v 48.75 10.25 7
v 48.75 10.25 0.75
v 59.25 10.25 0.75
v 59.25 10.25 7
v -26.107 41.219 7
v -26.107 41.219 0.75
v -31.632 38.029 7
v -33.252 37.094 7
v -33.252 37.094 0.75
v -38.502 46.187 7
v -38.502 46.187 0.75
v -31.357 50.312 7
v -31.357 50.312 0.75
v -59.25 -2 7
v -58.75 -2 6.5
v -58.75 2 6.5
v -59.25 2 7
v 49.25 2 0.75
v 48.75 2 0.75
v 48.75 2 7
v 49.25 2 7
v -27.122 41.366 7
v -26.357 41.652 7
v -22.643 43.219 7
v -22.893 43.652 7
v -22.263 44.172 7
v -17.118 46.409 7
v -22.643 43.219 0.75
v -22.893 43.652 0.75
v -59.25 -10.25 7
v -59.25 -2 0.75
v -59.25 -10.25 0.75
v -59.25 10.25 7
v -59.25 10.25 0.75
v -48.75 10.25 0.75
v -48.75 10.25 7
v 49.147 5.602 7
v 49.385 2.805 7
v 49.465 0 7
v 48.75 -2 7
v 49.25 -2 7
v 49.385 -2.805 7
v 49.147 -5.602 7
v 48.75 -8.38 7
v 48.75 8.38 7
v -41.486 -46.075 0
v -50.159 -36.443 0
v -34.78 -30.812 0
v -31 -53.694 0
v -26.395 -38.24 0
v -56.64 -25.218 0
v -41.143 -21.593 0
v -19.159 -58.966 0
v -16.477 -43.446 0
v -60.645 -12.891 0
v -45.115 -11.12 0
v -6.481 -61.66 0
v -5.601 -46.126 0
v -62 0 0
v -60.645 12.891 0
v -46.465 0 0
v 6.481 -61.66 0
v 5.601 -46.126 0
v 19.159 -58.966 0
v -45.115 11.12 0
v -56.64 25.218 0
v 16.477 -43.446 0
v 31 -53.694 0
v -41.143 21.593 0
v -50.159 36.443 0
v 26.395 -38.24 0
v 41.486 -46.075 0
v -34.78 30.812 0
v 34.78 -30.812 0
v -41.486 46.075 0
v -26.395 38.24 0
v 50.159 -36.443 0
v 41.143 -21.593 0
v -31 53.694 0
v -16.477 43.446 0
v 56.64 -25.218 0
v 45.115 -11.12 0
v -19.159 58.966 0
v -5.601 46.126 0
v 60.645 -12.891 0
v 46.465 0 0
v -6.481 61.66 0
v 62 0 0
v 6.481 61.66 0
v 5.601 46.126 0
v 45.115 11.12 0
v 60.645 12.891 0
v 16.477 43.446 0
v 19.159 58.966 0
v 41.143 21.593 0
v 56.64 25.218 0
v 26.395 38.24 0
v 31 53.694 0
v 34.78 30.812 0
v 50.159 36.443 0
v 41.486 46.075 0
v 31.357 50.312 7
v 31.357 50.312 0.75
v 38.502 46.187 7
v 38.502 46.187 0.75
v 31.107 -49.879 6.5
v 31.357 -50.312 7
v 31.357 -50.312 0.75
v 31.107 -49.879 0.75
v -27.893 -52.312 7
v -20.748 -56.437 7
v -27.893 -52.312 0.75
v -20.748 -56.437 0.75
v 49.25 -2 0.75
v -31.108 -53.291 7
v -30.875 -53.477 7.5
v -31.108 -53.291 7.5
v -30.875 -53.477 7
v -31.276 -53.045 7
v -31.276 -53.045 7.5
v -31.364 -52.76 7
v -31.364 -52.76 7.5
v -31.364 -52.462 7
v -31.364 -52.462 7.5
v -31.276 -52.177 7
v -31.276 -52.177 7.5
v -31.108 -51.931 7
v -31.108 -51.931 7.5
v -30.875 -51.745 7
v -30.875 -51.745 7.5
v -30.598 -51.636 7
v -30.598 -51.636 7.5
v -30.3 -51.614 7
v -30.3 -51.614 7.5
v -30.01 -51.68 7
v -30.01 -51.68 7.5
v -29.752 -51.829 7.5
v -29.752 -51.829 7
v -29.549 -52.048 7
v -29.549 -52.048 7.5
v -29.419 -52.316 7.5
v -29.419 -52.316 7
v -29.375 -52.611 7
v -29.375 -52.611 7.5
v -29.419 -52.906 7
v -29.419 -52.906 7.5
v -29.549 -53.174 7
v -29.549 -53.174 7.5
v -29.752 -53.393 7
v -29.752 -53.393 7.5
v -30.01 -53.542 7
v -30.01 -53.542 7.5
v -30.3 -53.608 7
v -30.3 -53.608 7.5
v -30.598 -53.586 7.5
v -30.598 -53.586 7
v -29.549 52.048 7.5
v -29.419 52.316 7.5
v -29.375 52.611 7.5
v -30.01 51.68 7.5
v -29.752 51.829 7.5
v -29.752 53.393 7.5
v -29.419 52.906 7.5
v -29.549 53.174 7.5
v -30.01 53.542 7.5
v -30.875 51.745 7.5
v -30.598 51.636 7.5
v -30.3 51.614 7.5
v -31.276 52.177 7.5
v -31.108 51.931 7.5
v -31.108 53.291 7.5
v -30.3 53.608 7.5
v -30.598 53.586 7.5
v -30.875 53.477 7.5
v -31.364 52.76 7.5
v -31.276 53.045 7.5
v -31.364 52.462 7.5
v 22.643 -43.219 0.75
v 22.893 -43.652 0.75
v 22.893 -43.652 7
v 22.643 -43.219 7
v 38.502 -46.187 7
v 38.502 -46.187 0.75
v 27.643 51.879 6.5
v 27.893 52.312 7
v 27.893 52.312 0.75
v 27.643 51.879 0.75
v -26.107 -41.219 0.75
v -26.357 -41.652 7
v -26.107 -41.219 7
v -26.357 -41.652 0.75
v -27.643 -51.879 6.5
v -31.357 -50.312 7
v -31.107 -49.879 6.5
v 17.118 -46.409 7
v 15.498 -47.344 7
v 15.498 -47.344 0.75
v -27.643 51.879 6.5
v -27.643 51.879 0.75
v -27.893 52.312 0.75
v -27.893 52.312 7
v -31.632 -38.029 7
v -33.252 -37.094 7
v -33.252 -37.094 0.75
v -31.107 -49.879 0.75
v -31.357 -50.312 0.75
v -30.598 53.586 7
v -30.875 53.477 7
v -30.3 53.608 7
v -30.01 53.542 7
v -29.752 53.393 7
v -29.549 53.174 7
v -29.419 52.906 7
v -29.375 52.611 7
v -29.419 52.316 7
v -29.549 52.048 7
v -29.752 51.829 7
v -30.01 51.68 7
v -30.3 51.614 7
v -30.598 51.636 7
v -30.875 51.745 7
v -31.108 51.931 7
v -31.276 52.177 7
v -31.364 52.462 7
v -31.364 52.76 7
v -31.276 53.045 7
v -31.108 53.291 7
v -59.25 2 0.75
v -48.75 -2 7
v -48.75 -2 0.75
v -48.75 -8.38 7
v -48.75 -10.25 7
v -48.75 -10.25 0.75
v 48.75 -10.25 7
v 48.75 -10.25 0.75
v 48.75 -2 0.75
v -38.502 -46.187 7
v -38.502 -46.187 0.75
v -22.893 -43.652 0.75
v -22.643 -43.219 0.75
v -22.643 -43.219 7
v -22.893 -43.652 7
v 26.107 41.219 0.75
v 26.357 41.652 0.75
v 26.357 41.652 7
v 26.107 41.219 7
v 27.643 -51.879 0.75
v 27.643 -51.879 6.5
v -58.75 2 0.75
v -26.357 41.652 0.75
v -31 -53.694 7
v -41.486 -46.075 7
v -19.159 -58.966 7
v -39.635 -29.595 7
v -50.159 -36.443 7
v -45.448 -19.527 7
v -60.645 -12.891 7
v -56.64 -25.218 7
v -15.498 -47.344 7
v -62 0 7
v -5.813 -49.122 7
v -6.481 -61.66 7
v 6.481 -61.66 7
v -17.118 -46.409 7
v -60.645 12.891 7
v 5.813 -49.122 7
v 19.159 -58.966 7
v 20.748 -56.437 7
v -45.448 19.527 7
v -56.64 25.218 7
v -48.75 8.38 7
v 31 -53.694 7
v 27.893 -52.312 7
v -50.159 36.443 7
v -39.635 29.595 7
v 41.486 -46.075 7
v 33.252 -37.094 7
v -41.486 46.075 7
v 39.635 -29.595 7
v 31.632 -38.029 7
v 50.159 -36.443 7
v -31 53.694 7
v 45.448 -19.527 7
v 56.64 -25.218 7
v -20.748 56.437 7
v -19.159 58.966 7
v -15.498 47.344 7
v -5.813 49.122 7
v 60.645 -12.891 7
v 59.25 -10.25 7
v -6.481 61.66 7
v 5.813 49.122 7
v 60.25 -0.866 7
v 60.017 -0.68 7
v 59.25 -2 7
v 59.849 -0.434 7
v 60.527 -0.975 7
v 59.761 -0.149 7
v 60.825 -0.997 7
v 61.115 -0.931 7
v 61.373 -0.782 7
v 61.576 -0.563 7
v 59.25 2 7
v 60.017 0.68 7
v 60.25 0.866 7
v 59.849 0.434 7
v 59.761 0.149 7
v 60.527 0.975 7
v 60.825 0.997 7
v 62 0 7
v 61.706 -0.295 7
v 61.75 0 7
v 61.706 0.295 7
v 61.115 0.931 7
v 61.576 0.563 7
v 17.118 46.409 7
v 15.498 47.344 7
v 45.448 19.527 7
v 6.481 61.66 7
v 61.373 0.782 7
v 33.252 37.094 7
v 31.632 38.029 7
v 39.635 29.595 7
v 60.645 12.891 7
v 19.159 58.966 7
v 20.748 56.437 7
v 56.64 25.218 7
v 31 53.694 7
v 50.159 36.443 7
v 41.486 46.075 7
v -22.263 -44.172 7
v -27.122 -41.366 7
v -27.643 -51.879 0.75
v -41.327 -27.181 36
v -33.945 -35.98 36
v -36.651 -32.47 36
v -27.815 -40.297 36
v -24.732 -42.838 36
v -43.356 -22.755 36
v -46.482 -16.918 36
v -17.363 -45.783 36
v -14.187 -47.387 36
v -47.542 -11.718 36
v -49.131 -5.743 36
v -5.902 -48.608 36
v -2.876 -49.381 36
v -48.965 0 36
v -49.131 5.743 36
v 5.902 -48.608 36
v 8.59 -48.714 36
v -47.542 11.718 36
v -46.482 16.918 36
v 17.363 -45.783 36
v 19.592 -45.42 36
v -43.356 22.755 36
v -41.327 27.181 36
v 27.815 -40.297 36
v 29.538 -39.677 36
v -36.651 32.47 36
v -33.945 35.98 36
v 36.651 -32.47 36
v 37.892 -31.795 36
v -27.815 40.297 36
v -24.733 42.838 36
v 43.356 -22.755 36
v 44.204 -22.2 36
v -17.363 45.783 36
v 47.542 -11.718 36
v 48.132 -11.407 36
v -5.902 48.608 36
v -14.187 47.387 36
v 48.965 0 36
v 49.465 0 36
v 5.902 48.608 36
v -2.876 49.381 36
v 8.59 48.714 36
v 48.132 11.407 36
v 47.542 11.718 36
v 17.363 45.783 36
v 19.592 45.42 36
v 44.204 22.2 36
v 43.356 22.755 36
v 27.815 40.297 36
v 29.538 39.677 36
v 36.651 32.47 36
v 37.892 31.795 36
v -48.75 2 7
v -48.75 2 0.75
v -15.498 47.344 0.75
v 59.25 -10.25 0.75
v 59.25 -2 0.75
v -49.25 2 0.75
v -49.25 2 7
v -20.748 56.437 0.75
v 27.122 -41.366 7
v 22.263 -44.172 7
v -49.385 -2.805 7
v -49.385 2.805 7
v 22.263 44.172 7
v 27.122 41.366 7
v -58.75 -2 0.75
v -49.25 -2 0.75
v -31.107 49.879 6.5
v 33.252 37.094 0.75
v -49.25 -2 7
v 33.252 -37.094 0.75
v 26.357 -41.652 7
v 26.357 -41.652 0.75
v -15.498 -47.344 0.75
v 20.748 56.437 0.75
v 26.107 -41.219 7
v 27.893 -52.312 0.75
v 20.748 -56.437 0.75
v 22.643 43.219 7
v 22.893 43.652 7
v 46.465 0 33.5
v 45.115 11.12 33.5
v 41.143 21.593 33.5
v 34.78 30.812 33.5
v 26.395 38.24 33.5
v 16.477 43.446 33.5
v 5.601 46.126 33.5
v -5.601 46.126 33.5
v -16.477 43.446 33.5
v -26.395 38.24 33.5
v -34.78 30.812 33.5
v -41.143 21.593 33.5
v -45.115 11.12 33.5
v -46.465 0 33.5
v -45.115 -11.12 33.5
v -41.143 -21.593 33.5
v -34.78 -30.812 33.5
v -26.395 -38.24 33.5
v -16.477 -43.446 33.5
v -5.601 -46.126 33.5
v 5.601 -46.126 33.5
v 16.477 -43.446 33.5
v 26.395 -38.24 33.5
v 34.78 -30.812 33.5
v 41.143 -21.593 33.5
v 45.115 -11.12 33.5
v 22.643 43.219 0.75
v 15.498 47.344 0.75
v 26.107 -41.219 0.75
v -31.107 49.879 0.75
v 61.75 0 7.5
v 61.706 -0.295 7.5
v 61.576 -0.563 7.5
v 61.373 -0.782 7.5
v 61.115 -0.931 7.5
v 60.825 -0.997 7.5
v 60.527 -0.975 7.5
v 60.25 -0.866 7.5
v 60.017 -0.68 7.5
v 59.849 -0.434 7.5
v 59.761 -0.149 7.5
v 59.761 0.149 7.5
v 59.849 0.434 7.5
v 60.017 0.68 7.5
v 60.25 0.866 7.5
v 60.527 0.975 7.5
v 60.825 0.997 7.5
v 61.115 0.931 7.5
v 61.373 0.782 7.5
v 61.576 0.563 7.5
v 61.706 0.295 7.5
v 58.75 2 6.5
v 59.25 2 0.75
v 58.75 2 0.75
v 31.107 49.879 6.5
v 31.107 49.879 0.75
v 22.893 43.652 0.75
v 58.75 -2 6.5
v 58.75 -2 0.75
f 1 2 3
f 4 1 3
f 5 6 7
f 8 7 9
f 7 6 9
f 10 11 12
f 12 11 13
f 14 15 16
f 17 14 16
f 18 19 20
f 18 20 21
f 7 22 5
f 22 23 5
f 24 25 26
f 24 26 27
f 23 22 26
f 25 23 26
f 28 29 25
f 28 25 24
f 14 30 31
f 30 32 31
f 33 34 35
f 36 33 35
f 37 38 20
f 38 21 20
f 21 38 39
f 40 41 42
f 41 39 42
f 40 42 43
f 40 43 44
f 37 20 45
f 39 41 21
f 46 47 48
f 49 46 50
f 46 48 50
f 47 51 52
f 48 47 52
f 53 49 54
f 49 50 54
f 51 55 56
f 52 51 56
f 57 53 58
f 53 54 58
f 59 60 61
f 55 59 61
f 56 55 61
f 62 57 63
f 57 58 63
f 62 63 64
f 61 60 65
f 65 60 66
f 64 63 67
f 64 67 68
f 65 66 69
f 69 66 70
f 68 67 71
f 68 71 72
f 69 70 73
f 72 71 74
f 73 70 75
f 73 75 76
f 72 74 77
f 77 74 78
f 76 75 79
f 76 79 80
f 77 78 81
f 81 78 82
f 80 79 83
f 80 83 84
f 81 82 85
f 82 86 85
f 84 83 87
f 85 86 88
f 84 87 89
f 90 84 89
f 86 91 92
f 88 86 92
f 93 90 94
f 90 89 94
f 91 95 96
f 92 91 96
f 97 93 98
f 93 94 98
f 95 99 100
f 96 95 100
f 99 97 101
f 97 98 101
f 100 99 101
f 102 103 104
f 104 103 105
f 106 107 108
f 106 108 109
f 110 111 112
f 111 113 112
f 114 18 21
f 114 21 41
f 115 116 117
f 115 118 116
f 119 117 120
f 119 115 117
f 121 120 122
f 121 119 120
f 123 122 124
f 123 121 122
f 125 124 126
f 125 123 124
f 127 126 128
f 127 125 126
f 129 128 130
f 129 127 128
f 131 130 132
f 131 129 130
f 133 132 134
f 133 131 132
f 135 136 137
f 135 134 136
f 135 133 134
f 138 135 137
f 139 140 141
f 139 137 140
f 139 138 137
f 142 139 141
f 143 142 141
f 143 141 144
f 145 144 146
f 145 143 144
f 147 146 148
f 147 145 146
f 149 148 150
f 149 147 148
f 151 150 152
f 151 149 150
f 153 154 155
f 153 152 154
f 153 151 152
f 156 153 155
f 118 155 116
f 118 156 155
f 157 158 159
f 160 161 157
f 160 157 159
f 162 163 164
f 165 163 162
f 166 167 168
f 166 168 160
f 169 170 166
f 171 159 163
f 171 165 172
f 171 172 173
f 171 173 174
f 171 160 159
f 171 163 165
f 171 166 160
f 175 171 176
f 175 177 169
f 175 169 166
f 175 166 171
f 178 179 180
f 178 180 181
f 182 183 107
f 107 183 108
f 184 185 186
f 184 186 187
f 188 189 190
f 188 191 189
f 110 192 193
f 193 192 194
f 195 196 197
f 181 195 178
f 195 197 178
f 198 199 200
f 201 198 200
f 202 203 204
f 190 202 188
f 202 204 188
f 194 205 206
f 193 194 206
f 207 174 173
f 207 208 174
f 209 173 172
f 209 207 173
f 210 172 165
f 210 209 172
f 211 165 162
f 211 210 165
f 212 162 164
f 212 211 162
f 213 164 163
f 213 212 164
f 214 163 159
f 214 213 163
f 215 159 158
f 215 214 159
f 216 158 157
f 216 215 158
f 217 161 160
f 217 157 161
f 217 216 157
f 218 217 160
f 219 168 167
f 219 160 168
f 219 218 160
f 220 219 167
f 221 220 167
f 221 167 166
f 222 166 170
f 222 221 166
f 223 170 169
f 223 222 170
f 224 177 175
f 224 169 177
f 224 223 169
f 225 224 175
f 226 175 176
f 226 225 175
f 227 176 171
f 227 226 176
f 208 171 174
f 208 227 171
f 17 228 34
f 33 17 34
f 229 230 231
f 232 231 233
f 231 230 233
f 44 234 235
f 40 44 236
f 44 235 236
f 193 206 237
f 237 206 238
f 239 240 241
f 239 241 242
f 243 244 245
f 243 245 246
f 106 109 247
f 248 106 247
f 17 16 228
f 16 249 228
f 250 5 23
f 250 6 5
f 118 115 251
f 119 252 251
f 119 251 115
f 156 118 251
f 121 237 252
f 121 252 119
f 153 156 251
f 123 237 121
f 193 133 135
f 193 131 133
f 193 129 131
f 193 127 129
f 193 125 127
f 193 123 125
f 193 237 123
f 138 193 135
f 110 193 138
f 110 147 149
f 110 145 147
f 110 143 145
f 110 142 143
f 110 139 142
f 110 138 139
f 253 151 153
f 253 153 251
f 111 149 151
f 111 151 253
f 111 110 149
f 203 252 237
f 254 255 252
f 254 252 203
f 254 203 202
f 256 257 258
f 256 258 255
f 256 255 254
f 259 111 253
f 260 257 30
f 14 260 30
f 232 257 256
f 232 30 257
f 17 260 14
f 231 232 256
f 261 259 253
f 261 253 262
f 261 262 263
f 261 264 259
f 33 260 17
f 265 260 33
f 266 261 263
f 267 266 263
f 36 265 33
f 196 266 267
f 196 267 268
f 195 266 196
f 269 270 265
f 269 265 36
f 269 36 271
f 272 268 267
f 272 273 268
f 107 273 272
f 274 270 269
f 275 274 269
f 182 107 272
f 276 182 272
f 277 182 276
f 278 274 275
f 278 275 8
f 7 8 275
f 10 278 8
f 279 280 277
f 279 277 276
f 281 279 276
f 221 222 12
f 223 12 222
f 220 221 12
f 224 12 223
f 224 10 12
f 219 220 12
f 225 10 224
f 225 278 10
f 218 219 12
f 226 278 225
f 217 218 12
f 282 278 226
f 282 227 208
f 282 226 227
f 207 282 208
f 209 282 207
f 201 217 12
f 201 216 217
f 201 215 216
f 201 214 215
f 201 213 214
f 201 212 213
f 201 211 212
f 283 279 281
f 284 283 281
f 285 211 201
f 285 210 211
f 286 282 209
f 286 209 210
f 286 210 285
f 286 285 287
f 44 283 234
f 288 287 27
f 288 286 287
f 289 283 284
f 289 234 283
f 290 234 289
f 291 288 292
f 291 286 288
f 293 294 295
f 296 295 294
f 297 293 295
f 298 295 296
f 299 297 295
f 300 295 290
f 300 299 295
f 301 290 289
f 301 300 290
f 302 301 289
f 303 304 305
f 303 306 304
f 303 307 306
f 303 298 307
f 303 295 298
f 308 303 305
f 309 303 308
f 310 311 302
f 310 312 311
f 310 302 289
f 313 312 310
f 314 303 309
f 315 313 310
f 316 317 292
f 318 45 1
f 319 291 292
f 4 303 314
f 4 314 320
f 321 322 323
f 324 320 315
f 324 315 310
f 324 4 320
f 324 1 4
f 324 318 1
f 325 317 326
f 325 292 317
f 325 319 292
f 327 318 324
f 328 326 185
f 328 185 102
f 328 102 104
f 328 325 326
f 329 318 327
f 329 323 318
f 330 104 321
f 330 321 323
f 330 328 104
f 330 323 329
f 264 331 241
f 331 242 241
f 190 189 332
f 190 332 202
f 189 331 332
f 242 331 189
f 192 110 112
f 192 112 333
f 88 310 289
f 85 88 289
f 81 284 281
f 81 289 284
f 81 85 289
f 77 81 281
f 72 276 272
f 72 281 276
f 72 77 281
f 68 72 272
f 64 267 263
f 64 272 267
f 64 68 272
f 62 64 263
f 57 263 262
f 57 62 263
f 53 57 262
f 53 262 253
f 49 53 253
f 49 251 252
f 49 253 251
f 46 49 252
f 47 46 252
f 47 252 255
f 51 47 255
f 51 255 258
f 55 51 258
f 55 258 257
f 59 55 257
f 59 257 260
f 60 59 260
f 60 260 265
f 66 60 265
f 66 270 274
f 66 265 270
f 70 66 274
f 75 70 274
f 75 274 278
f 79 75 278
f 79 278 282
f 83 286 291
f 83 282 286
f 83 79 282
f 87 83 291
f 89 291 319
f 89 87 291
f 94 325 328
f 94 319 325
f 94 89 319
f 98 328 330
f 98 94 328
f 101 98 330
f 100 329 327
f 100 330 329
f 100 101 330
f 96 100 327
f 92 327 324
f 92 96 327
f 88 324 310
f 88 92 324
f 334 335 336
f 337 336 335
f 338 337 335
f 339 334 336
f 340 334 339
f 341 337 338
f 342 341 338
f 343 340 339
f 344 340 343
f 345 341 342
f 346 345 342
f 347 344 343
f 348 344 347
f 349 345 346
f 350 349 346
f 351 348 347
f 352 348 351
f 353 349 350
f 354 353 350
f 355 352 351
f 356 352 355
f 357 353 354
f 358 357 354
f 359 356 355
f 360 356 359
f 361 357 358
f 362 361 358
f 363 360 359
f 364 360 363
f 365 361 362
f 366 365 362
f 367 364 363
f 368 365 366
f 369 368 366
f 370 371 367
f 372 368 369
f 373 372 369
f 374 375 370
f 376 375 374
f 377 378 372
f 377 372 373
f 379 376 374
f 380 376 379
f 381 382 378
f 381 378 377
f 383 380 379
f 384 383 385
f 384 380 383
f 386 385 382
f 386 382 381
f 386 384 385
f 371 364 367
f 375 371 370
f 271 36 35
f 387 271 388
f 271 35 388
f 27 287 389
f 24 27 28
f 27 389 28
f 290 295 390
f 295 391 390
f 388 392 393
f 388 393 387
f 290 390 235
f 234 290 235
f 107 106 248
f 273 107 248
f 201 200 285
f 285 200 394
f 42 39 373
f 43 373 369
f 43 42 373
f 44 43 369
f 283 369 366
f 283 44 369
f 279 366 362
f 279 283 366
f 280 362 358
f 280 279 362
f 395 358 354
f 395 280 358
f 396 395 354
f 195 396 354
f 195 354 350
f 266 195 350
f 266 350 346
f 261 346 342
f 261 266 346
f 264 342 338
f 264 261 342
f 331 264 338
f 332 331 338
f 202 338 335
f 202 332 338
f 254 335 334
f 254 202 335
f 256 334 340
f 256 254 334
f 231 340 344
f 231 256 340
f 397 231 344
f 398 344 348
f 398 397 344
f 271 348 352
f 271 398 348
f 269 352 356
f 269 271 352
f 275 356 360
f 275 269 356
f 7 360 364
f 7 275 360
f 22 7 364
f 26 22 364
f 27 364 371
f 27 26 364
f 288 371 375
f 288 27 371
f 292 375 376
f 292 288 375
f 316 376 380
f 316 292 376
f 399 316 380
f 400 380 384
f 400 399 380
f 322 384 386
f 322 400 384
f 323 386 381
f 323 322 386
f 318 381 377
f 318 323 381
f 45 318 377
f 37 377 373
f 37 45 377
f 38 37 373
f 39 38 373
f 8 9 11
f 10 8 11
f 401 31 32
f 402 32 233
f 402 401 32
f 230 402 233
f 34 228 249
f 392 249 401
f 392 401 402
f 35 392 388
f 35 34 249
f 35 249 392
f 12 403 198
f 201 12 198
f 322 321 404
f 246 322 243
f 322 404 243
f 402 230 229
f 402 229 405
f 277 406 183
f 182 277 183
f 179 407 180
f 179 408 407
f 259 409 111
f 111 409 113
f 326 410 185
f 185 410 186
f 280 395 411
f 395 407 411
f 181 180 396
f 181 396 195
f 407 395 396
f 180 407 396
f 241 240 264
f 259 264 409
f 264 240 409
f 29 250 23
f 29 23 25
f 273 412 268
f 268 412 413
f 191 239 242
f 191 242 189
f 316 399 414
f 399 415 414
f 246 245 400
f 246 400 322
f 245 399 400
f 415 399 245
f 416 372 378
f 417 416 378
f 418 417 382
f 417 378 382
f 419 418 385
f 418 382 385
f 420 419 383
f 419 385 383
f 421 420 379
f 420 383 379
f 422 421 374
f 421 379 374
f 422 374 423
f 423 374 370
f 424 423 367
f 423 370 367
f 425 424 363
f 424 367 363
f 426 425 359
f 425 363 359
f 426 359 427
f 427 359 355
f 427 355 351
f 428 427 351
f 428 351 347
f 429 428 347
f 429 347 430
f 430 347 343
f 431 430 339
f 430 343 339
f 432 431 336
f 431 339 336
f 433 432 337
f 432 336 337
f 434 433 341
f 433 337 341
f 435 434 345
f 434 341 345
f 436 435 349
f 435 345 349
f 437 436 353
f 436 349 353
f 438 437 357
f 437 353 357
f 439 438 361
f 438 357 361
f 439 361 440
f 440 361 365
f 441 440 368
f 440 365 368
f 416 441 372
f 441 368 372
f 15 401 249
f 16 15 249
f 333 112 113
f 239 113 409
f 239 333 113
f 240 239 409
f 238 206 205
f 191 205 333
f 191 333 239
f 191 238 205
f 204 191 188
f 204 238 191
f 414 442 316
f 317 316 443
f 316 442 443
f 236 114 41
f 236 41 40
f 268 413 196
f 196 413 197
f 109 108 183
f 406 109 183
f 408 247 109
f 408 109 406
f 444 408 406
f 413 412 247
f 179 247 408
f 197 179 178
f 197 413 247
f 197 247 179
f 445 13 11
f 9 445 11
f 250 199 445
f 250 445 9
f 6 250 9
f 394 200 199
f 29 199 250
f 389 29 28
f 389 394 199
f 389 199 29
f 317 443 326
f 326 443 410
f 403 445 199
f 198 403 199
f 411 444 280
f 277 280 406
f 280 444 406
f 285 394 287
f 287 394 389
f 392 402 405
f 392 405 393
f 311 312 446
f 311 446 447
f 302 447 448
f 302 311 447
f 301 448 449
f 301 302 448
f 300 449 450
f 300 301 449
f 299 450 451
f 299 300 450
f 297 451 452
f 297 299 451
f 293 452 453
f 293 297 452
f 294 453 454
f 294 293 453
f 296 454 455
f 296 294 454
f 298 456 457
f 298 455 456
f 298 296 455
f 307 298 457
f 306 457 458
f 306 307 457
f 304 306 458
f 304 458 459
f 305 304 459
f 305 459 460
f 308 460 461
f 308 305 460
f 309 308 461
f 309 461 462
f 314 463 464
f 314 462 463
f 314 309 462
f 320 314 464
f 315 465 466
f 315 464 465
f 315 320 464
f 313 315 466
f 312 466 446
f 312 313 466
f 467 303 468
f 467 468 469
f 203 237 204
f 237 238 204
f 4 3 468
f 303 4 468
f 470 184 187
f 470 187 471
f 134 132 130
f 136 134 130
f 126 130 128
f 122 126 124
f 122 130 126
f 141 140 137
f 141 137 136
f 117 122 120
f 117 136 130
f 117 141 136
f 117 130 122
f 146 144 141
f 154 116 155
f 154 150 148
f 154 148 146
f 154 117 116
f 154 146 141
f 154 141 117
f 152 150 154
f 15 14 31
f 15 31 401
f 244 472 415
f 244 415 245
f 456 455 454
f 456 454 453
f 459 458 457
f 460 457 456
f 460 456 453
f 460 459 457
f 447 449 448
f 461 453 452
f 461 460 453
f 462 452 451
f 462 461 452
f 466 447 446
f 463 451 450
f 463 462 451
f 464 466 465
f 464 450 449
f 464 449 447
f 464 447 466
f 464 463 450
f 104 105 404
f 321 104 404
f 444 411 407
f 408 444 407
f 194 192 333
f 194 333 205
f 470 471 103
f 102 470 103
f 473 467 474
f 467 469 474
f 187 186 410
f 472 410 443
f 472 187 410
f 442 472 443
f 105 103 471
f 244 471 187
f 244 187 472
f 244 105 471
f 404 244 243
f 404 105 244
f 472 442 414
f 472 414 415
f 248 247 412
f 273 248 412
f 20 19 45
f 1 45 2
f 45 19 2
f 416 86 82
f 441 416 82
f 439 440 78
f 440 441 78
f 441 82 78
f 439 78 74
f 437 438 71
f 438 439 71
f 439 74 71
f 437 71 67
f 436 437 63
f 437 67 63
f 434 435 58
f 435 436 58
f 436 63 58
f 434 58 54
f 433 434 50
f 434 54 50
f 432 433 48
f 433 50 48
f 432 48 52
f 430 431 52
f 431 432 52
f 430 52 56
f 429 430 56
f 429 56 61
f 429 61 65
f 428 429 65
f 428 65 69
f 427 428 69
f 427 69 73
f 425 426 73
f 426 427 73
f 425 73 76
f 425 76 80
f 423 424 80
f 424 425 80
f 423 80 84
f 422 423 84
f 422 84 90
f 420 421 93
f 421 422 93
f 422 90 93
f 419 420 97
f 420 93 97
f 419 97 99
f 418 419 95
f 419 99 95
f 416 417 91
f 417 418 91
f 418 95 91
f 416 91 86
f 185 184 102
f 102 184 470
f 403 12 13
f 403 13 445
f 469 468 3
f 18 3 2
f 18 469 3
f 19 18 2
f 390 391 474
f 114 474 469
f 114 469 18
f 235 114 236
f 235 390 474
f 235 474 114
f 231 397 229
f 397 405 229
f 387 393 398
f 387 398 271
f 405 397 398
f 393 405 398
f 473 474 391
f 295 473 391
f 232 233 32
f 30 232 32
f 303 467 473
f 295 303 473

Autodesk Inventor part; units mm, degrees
ref_plane "YZ Plane" through (0, 0, 0) normal (1, 0, 0) x (0, 1, 0)
ref_plane "XZ Plane" through (0, 0, 0) normal (0, 1, 0) x (-1, 0, 0)
ref_plane "XY Plane" through (0, 0, 0) normal (0, 0, 1) x (1, 0, 0)
sketch "Sketch1" plane through (0, 0, 0) normal (0, 0, 1) x (1, 0, 0)
  circle A0 centre (0, 0) radius 46.465
  line L0 (48.75, 10.25) -> (59.25, 10.25)
  line L1 (59.25, 10.25) -> (59.25, -10.25)
  line L2 (59.25, -10.25) -> (48.75, -10.25)
  line L3 (48.75, -10.25) -> (48.75, 10.25)
  circle A1 centre (0, 0) radius 62
  line L4 (59.25, 2) -> (58.75, 2)
  line L5 (58.75, 2) -> (58.75, -2)
  line L6 (58.75, -2) -> (59.25, -2)
  line L7 (59.25, -2) -> (59.25, 2)
  line L8 (54, 10.25) -> (54, -10.25)
  line L9 (48.75, 2) -> (49.25, 2)
  line L10 (49.25, 2) -> (49.25, -2)
  line L11 (49.25, -2) -> (48.75, -2)
  line L12 (48.75, -2) -> (48.75, 2)
  line L13 (27.8929, 52.312) -> (27.6429, 51.879)
  line L14 (31.1071, 49.879) -> (31.3571, 50.312)
  line L15 (31.3571, 50.312) -> (27.8929, 52.312)
  line L16 (27.6429, 51.879) -> (31.1071, 49.879)
  line L17 (22.6429, 43.2187) -> (22.8929, 43.6518)
  line L18 (22.8929, 43.6518) -> (26.3571, 41.6518)
  line L19 (26.1071, 41.2187) -> (22.6429, 43.2187)
  line L20 (26.3571, 41.6518) -> (26.1071, 41.2187)
  line L21 (33.2518, 37.0937) -> (15.4982, 47.3437)
  line L22 (38.5018, 46.187) -> (33.2518, 37.0937)
  line L23 (20.7482, 56.437) -> (38.5018, 46.187)
  line L24 (15.4982, 47.3437) -> (20.7482, 56.437)
  line L25 (-31.3571, 50.312) -> (-31.1071, 49.879)
  line L26 (-27.6429, 51.879) -> (-27.8929, 52.312)
  line L27 (-27.8929, 52.312) -> (-31.3571, 50.312)
  line L28 (-31.1071, 49.879) -> (-27.6429, 51.879)
  line L29 (-26.1071, 41.2187) -> (-26.3571, 41.6518)
  line L30 (-26.3571, 41.6518) -> (-22.8929, 43.6518)
  line L31 (-22.6429, 43.2187) -> (-26.1071, 41.2187)
  line L32 (-22.8929, 43.6518) -> (-22.6429, 43.2187)
  line L33 (-15.4982, 47.3437) -> (-33.2518, 37.0937)
  line L34 (-20.7482, 56.437) -> (-15.4982, 47.3437)
  line L35 (-38.5018, 46.187) -> (-20.7482, 56.437)
  line L36 (-33.2518, 37.0937) -> (-38.5018, 46.187)
  line L37 (-59.25, -2) -> (-58.75, -2)
  line L38 (-58.75, 2) -> (-59.25, 2)
  line L39 (-59.25, 2) -> (-59.25, -2)
  line L40 (-58.75, -2) -> (-58.75, 2)
  line L41 (-48.75, -2) -> (-49.25, -2)
  line L42 (-49.25, -2) -> (-49.25, 2)
  line L43 (-48.75, 2) -> (-48.75, -2)
  line L44 (-49.25, 2) -> (-48.75, 2)
  line L45 (-48.75, 10.25) -> (-48.75, -10.25)
  line L46 (-59.25, 10.25) -> (-48.75, 10.25)
  line L47 (-59.25, -10.25) -> (-59.25, 10.25)
  line L48 (-48.75, -10.25) -> (-59.25, -10.25)
  line L49 (-27.8929, -52.312) -> (-27.6429, -51.879)
  line L50 (-31.1071, -49.879) -> (-31.3571, -50.312)
  line L51 (-31.3571, -50.312) -> (-27.8929, -52.312)
  line L52 (-27.6429, -51.879) -> (-31.1071, -49.879)
  line L53 (-22.6429, -43.2187) -> (-22.8929, -43.6518)
  line L54 (-22.8929, -43.6518) -> (-26.3571, -41.6518)
  line L55 (-26.1071, -41.2187) -> (-22.6429, -43.2187)
  line L56 (-26.3571, -41.6518) -> (-26.1071, -41.2187)
  line L57 (-33.2518, -37.0937) -> (-15.4982, -47.3437)
  line L58 (-38.5018, -46.187) -> (-33.2518, -37.0937)
  line L59 (-20.7482, -56.437) -> (-38.5018, -46.187)
  line L60 (-15.4982, -47.3437) -> (-20.7482, -56.437)
  line L61 (31.3571, -50.312) -> (31.1071, -49.879)
  line L62 (27.6429, -51.879) -> (27.8929, -52.312)
  line L63 (27.8929, -52.312) -> (31.3571, -50.312)
  line L64 (31.1071, -49.879) -> (27.6429, -51.879)
  line L65 (26.1071, -41.2187) -> (26.3571, -41.6518)
  line L66 (26.3571, -41.6518) -> (22.8929, -43.6518)
  line L67 (22.6429, -43.2187) -> (26.1071, -41.2187)
  line L68 (22.8929, -43.6518) -> (22.6429, -43.2187)
  line L69 (15.4982, -47.3437) -> (33.2518, -37.0937)
  line L70 (20.7482, -56.437) -> (15.4982, -47.3437)
  line L71 (38.5018, -46.187) -> (20.7482, -56.437)
  line L72 (33.2518, -37.0937) -> (38.5018, -46.187)
  circle A2 centre (0, 0) radius 49.465
  point P0 (35.8768, 41.6404)
  point P1 (18.1232, 51.8904)
  point P2 (-18.1232, 51.8904)
  point P3 (-35.8768, 41.6404)
  point P4 (-54, 10.25)
  point P5 (-54, -10.25)
  point P6 (-35.8768, -41.6404)
  point P7 (-18.1232, -51.8904)
  point P8 (18.1232, -51.8904)
  point P9 (35.8768, -41.6404)
  dimension "d1" = 92.93
  dimension "d16" = 20.5
  dimension "d17" = 10.5
  dimension "d71" = 54
  dimension "d72" = 10.25
  dimension "d73" = 124
  dimension "d74" = 4
  dimension "d75" = 0.5
  dimension "d76" = 2
  dimension "d83" = 360
  dimension "d85" = 98.93
extrude "Extrusion9" add sketch "Sketch1" along normal blind 7 contours A0 | L0 L8 L2 L3 A2 | L0 L1 L4 L5 L6 L2 L8 | A2 L3 L11 L10 L9 | L3 A2 L69 L67 L57 L55 L45 L43 L33 L31 L21 L19 | L9 L10 L11 L3 | A2 L21 L24 L23 L13 L16 L14 L22 | L21 L20 L18 L17 A2 | L1 L6 L5 L4 | L19 L17 L18 L20 | A2 L69 L68 L66 L65 | L69 L72 L71 L61 L64 L62 L70 A2 | A2 L33 L36 L35 L25 L28 L26 L34 | L33 L32 L30 L29 A2 | L65 L66 L68 L67 | L14 L16 L13 L15 | L31 L29 L30 L32 | A2 L57 L56 L54 L53 | L57 L60 L59 L49 L52 L50 L58 A2 | A2 L45 L48 L47 L37 L40 L38 L46 | L45 L44 L42 L41 A2 | L63 L62 L64 L61 | L53 L54 L56 L55 | L26 L28 L25 L27 | L43 L41 L42 L44 | L51 L50 L52 L49 | L38 L40 L37 L39 | A1
extrude "Extrusion10" add sketch "Sketch1" along normal blind 36 contours A0 | A2 L3 L11 L10 L9 | L3 A2 L69 L67 L57 L55 L45 L43 L33 L31 L21 L19 | L9 L10 L11 L3 | L21 L20 L18 L17 A2 | L19 L17 L18 L20 | A2 L69 L68 L66 L65 | L33 L32 L30 L29 A2 | L65 L66 L68 L67 | L31 L29 L30 L32 | A2 L57 L56 L54 L53 | L45 L44 L42 L41 A2 | L53 L54 L56 L55 | L43 L41 L42 L44
extrude "Extrusion11" cut sketch "Sketch1" along normal blind 36 contours A0
extrude "Extrusion12" cut sketch "Sketch1" along normal blind 7 contours A2 L45 L48 L47 L37 L40 L38 L46 | L45 L44 L42 L41 A2 | L43 L41 L42 L44 | L38 L40 L37 L39
extrude "Extrusion13" add sketch "Sketch1" along normal blind 7 contours L43 L41 L42 L44 | L38 L40 L37 L39
extrude "Extrusion14" add sketch "Sketch1" along normal blind 0.75 contours A2 L45 L48 L47 L37 L40 L38 L46 | L45 L44 L42 L41 A2 | L43 L41 L42 L44 | L38 L40 L37 L39
chamfer "Chamfer4" distance 0.5 angle 45 1 edges at (-58.75, 0, 7)
pattern_circular "Circular Pattern3" count 6 over 360 about axis through (0, 0, 0) along (0, 0, 1) of "Extrusion12", "Extrusion13", "Extrusion14", "Chamfer4"
chamfer "Chamfer5" distance 2.5 angle 45 1 edges at (-46.465, 0, 36)
sketch "Sketch3" plane through (0, 0, 7) normal (0, 0, 1) x (1, 0, 0)
  circle A0 centre (60.75, 0) radius 1
  line L0 (59.25, -2) -> (59.25, 2) projected
  point P0 (0, 0)
  dimension "d107" = 2
  dimension "d108" = 1.5
extrude "Extrusion15" add sketch "Sketch3" along normal blind 0.5
pattern_circular "Circular Pattern4" count 3 over 360 about axis through (0, 0, 0) along (0, 0, 1) of "Extrusion15"
equation "\"d72\" = 0.5 * d16"
equation "\"d76\" = 0.5 * d74"
properties part number "4inchFemale"
